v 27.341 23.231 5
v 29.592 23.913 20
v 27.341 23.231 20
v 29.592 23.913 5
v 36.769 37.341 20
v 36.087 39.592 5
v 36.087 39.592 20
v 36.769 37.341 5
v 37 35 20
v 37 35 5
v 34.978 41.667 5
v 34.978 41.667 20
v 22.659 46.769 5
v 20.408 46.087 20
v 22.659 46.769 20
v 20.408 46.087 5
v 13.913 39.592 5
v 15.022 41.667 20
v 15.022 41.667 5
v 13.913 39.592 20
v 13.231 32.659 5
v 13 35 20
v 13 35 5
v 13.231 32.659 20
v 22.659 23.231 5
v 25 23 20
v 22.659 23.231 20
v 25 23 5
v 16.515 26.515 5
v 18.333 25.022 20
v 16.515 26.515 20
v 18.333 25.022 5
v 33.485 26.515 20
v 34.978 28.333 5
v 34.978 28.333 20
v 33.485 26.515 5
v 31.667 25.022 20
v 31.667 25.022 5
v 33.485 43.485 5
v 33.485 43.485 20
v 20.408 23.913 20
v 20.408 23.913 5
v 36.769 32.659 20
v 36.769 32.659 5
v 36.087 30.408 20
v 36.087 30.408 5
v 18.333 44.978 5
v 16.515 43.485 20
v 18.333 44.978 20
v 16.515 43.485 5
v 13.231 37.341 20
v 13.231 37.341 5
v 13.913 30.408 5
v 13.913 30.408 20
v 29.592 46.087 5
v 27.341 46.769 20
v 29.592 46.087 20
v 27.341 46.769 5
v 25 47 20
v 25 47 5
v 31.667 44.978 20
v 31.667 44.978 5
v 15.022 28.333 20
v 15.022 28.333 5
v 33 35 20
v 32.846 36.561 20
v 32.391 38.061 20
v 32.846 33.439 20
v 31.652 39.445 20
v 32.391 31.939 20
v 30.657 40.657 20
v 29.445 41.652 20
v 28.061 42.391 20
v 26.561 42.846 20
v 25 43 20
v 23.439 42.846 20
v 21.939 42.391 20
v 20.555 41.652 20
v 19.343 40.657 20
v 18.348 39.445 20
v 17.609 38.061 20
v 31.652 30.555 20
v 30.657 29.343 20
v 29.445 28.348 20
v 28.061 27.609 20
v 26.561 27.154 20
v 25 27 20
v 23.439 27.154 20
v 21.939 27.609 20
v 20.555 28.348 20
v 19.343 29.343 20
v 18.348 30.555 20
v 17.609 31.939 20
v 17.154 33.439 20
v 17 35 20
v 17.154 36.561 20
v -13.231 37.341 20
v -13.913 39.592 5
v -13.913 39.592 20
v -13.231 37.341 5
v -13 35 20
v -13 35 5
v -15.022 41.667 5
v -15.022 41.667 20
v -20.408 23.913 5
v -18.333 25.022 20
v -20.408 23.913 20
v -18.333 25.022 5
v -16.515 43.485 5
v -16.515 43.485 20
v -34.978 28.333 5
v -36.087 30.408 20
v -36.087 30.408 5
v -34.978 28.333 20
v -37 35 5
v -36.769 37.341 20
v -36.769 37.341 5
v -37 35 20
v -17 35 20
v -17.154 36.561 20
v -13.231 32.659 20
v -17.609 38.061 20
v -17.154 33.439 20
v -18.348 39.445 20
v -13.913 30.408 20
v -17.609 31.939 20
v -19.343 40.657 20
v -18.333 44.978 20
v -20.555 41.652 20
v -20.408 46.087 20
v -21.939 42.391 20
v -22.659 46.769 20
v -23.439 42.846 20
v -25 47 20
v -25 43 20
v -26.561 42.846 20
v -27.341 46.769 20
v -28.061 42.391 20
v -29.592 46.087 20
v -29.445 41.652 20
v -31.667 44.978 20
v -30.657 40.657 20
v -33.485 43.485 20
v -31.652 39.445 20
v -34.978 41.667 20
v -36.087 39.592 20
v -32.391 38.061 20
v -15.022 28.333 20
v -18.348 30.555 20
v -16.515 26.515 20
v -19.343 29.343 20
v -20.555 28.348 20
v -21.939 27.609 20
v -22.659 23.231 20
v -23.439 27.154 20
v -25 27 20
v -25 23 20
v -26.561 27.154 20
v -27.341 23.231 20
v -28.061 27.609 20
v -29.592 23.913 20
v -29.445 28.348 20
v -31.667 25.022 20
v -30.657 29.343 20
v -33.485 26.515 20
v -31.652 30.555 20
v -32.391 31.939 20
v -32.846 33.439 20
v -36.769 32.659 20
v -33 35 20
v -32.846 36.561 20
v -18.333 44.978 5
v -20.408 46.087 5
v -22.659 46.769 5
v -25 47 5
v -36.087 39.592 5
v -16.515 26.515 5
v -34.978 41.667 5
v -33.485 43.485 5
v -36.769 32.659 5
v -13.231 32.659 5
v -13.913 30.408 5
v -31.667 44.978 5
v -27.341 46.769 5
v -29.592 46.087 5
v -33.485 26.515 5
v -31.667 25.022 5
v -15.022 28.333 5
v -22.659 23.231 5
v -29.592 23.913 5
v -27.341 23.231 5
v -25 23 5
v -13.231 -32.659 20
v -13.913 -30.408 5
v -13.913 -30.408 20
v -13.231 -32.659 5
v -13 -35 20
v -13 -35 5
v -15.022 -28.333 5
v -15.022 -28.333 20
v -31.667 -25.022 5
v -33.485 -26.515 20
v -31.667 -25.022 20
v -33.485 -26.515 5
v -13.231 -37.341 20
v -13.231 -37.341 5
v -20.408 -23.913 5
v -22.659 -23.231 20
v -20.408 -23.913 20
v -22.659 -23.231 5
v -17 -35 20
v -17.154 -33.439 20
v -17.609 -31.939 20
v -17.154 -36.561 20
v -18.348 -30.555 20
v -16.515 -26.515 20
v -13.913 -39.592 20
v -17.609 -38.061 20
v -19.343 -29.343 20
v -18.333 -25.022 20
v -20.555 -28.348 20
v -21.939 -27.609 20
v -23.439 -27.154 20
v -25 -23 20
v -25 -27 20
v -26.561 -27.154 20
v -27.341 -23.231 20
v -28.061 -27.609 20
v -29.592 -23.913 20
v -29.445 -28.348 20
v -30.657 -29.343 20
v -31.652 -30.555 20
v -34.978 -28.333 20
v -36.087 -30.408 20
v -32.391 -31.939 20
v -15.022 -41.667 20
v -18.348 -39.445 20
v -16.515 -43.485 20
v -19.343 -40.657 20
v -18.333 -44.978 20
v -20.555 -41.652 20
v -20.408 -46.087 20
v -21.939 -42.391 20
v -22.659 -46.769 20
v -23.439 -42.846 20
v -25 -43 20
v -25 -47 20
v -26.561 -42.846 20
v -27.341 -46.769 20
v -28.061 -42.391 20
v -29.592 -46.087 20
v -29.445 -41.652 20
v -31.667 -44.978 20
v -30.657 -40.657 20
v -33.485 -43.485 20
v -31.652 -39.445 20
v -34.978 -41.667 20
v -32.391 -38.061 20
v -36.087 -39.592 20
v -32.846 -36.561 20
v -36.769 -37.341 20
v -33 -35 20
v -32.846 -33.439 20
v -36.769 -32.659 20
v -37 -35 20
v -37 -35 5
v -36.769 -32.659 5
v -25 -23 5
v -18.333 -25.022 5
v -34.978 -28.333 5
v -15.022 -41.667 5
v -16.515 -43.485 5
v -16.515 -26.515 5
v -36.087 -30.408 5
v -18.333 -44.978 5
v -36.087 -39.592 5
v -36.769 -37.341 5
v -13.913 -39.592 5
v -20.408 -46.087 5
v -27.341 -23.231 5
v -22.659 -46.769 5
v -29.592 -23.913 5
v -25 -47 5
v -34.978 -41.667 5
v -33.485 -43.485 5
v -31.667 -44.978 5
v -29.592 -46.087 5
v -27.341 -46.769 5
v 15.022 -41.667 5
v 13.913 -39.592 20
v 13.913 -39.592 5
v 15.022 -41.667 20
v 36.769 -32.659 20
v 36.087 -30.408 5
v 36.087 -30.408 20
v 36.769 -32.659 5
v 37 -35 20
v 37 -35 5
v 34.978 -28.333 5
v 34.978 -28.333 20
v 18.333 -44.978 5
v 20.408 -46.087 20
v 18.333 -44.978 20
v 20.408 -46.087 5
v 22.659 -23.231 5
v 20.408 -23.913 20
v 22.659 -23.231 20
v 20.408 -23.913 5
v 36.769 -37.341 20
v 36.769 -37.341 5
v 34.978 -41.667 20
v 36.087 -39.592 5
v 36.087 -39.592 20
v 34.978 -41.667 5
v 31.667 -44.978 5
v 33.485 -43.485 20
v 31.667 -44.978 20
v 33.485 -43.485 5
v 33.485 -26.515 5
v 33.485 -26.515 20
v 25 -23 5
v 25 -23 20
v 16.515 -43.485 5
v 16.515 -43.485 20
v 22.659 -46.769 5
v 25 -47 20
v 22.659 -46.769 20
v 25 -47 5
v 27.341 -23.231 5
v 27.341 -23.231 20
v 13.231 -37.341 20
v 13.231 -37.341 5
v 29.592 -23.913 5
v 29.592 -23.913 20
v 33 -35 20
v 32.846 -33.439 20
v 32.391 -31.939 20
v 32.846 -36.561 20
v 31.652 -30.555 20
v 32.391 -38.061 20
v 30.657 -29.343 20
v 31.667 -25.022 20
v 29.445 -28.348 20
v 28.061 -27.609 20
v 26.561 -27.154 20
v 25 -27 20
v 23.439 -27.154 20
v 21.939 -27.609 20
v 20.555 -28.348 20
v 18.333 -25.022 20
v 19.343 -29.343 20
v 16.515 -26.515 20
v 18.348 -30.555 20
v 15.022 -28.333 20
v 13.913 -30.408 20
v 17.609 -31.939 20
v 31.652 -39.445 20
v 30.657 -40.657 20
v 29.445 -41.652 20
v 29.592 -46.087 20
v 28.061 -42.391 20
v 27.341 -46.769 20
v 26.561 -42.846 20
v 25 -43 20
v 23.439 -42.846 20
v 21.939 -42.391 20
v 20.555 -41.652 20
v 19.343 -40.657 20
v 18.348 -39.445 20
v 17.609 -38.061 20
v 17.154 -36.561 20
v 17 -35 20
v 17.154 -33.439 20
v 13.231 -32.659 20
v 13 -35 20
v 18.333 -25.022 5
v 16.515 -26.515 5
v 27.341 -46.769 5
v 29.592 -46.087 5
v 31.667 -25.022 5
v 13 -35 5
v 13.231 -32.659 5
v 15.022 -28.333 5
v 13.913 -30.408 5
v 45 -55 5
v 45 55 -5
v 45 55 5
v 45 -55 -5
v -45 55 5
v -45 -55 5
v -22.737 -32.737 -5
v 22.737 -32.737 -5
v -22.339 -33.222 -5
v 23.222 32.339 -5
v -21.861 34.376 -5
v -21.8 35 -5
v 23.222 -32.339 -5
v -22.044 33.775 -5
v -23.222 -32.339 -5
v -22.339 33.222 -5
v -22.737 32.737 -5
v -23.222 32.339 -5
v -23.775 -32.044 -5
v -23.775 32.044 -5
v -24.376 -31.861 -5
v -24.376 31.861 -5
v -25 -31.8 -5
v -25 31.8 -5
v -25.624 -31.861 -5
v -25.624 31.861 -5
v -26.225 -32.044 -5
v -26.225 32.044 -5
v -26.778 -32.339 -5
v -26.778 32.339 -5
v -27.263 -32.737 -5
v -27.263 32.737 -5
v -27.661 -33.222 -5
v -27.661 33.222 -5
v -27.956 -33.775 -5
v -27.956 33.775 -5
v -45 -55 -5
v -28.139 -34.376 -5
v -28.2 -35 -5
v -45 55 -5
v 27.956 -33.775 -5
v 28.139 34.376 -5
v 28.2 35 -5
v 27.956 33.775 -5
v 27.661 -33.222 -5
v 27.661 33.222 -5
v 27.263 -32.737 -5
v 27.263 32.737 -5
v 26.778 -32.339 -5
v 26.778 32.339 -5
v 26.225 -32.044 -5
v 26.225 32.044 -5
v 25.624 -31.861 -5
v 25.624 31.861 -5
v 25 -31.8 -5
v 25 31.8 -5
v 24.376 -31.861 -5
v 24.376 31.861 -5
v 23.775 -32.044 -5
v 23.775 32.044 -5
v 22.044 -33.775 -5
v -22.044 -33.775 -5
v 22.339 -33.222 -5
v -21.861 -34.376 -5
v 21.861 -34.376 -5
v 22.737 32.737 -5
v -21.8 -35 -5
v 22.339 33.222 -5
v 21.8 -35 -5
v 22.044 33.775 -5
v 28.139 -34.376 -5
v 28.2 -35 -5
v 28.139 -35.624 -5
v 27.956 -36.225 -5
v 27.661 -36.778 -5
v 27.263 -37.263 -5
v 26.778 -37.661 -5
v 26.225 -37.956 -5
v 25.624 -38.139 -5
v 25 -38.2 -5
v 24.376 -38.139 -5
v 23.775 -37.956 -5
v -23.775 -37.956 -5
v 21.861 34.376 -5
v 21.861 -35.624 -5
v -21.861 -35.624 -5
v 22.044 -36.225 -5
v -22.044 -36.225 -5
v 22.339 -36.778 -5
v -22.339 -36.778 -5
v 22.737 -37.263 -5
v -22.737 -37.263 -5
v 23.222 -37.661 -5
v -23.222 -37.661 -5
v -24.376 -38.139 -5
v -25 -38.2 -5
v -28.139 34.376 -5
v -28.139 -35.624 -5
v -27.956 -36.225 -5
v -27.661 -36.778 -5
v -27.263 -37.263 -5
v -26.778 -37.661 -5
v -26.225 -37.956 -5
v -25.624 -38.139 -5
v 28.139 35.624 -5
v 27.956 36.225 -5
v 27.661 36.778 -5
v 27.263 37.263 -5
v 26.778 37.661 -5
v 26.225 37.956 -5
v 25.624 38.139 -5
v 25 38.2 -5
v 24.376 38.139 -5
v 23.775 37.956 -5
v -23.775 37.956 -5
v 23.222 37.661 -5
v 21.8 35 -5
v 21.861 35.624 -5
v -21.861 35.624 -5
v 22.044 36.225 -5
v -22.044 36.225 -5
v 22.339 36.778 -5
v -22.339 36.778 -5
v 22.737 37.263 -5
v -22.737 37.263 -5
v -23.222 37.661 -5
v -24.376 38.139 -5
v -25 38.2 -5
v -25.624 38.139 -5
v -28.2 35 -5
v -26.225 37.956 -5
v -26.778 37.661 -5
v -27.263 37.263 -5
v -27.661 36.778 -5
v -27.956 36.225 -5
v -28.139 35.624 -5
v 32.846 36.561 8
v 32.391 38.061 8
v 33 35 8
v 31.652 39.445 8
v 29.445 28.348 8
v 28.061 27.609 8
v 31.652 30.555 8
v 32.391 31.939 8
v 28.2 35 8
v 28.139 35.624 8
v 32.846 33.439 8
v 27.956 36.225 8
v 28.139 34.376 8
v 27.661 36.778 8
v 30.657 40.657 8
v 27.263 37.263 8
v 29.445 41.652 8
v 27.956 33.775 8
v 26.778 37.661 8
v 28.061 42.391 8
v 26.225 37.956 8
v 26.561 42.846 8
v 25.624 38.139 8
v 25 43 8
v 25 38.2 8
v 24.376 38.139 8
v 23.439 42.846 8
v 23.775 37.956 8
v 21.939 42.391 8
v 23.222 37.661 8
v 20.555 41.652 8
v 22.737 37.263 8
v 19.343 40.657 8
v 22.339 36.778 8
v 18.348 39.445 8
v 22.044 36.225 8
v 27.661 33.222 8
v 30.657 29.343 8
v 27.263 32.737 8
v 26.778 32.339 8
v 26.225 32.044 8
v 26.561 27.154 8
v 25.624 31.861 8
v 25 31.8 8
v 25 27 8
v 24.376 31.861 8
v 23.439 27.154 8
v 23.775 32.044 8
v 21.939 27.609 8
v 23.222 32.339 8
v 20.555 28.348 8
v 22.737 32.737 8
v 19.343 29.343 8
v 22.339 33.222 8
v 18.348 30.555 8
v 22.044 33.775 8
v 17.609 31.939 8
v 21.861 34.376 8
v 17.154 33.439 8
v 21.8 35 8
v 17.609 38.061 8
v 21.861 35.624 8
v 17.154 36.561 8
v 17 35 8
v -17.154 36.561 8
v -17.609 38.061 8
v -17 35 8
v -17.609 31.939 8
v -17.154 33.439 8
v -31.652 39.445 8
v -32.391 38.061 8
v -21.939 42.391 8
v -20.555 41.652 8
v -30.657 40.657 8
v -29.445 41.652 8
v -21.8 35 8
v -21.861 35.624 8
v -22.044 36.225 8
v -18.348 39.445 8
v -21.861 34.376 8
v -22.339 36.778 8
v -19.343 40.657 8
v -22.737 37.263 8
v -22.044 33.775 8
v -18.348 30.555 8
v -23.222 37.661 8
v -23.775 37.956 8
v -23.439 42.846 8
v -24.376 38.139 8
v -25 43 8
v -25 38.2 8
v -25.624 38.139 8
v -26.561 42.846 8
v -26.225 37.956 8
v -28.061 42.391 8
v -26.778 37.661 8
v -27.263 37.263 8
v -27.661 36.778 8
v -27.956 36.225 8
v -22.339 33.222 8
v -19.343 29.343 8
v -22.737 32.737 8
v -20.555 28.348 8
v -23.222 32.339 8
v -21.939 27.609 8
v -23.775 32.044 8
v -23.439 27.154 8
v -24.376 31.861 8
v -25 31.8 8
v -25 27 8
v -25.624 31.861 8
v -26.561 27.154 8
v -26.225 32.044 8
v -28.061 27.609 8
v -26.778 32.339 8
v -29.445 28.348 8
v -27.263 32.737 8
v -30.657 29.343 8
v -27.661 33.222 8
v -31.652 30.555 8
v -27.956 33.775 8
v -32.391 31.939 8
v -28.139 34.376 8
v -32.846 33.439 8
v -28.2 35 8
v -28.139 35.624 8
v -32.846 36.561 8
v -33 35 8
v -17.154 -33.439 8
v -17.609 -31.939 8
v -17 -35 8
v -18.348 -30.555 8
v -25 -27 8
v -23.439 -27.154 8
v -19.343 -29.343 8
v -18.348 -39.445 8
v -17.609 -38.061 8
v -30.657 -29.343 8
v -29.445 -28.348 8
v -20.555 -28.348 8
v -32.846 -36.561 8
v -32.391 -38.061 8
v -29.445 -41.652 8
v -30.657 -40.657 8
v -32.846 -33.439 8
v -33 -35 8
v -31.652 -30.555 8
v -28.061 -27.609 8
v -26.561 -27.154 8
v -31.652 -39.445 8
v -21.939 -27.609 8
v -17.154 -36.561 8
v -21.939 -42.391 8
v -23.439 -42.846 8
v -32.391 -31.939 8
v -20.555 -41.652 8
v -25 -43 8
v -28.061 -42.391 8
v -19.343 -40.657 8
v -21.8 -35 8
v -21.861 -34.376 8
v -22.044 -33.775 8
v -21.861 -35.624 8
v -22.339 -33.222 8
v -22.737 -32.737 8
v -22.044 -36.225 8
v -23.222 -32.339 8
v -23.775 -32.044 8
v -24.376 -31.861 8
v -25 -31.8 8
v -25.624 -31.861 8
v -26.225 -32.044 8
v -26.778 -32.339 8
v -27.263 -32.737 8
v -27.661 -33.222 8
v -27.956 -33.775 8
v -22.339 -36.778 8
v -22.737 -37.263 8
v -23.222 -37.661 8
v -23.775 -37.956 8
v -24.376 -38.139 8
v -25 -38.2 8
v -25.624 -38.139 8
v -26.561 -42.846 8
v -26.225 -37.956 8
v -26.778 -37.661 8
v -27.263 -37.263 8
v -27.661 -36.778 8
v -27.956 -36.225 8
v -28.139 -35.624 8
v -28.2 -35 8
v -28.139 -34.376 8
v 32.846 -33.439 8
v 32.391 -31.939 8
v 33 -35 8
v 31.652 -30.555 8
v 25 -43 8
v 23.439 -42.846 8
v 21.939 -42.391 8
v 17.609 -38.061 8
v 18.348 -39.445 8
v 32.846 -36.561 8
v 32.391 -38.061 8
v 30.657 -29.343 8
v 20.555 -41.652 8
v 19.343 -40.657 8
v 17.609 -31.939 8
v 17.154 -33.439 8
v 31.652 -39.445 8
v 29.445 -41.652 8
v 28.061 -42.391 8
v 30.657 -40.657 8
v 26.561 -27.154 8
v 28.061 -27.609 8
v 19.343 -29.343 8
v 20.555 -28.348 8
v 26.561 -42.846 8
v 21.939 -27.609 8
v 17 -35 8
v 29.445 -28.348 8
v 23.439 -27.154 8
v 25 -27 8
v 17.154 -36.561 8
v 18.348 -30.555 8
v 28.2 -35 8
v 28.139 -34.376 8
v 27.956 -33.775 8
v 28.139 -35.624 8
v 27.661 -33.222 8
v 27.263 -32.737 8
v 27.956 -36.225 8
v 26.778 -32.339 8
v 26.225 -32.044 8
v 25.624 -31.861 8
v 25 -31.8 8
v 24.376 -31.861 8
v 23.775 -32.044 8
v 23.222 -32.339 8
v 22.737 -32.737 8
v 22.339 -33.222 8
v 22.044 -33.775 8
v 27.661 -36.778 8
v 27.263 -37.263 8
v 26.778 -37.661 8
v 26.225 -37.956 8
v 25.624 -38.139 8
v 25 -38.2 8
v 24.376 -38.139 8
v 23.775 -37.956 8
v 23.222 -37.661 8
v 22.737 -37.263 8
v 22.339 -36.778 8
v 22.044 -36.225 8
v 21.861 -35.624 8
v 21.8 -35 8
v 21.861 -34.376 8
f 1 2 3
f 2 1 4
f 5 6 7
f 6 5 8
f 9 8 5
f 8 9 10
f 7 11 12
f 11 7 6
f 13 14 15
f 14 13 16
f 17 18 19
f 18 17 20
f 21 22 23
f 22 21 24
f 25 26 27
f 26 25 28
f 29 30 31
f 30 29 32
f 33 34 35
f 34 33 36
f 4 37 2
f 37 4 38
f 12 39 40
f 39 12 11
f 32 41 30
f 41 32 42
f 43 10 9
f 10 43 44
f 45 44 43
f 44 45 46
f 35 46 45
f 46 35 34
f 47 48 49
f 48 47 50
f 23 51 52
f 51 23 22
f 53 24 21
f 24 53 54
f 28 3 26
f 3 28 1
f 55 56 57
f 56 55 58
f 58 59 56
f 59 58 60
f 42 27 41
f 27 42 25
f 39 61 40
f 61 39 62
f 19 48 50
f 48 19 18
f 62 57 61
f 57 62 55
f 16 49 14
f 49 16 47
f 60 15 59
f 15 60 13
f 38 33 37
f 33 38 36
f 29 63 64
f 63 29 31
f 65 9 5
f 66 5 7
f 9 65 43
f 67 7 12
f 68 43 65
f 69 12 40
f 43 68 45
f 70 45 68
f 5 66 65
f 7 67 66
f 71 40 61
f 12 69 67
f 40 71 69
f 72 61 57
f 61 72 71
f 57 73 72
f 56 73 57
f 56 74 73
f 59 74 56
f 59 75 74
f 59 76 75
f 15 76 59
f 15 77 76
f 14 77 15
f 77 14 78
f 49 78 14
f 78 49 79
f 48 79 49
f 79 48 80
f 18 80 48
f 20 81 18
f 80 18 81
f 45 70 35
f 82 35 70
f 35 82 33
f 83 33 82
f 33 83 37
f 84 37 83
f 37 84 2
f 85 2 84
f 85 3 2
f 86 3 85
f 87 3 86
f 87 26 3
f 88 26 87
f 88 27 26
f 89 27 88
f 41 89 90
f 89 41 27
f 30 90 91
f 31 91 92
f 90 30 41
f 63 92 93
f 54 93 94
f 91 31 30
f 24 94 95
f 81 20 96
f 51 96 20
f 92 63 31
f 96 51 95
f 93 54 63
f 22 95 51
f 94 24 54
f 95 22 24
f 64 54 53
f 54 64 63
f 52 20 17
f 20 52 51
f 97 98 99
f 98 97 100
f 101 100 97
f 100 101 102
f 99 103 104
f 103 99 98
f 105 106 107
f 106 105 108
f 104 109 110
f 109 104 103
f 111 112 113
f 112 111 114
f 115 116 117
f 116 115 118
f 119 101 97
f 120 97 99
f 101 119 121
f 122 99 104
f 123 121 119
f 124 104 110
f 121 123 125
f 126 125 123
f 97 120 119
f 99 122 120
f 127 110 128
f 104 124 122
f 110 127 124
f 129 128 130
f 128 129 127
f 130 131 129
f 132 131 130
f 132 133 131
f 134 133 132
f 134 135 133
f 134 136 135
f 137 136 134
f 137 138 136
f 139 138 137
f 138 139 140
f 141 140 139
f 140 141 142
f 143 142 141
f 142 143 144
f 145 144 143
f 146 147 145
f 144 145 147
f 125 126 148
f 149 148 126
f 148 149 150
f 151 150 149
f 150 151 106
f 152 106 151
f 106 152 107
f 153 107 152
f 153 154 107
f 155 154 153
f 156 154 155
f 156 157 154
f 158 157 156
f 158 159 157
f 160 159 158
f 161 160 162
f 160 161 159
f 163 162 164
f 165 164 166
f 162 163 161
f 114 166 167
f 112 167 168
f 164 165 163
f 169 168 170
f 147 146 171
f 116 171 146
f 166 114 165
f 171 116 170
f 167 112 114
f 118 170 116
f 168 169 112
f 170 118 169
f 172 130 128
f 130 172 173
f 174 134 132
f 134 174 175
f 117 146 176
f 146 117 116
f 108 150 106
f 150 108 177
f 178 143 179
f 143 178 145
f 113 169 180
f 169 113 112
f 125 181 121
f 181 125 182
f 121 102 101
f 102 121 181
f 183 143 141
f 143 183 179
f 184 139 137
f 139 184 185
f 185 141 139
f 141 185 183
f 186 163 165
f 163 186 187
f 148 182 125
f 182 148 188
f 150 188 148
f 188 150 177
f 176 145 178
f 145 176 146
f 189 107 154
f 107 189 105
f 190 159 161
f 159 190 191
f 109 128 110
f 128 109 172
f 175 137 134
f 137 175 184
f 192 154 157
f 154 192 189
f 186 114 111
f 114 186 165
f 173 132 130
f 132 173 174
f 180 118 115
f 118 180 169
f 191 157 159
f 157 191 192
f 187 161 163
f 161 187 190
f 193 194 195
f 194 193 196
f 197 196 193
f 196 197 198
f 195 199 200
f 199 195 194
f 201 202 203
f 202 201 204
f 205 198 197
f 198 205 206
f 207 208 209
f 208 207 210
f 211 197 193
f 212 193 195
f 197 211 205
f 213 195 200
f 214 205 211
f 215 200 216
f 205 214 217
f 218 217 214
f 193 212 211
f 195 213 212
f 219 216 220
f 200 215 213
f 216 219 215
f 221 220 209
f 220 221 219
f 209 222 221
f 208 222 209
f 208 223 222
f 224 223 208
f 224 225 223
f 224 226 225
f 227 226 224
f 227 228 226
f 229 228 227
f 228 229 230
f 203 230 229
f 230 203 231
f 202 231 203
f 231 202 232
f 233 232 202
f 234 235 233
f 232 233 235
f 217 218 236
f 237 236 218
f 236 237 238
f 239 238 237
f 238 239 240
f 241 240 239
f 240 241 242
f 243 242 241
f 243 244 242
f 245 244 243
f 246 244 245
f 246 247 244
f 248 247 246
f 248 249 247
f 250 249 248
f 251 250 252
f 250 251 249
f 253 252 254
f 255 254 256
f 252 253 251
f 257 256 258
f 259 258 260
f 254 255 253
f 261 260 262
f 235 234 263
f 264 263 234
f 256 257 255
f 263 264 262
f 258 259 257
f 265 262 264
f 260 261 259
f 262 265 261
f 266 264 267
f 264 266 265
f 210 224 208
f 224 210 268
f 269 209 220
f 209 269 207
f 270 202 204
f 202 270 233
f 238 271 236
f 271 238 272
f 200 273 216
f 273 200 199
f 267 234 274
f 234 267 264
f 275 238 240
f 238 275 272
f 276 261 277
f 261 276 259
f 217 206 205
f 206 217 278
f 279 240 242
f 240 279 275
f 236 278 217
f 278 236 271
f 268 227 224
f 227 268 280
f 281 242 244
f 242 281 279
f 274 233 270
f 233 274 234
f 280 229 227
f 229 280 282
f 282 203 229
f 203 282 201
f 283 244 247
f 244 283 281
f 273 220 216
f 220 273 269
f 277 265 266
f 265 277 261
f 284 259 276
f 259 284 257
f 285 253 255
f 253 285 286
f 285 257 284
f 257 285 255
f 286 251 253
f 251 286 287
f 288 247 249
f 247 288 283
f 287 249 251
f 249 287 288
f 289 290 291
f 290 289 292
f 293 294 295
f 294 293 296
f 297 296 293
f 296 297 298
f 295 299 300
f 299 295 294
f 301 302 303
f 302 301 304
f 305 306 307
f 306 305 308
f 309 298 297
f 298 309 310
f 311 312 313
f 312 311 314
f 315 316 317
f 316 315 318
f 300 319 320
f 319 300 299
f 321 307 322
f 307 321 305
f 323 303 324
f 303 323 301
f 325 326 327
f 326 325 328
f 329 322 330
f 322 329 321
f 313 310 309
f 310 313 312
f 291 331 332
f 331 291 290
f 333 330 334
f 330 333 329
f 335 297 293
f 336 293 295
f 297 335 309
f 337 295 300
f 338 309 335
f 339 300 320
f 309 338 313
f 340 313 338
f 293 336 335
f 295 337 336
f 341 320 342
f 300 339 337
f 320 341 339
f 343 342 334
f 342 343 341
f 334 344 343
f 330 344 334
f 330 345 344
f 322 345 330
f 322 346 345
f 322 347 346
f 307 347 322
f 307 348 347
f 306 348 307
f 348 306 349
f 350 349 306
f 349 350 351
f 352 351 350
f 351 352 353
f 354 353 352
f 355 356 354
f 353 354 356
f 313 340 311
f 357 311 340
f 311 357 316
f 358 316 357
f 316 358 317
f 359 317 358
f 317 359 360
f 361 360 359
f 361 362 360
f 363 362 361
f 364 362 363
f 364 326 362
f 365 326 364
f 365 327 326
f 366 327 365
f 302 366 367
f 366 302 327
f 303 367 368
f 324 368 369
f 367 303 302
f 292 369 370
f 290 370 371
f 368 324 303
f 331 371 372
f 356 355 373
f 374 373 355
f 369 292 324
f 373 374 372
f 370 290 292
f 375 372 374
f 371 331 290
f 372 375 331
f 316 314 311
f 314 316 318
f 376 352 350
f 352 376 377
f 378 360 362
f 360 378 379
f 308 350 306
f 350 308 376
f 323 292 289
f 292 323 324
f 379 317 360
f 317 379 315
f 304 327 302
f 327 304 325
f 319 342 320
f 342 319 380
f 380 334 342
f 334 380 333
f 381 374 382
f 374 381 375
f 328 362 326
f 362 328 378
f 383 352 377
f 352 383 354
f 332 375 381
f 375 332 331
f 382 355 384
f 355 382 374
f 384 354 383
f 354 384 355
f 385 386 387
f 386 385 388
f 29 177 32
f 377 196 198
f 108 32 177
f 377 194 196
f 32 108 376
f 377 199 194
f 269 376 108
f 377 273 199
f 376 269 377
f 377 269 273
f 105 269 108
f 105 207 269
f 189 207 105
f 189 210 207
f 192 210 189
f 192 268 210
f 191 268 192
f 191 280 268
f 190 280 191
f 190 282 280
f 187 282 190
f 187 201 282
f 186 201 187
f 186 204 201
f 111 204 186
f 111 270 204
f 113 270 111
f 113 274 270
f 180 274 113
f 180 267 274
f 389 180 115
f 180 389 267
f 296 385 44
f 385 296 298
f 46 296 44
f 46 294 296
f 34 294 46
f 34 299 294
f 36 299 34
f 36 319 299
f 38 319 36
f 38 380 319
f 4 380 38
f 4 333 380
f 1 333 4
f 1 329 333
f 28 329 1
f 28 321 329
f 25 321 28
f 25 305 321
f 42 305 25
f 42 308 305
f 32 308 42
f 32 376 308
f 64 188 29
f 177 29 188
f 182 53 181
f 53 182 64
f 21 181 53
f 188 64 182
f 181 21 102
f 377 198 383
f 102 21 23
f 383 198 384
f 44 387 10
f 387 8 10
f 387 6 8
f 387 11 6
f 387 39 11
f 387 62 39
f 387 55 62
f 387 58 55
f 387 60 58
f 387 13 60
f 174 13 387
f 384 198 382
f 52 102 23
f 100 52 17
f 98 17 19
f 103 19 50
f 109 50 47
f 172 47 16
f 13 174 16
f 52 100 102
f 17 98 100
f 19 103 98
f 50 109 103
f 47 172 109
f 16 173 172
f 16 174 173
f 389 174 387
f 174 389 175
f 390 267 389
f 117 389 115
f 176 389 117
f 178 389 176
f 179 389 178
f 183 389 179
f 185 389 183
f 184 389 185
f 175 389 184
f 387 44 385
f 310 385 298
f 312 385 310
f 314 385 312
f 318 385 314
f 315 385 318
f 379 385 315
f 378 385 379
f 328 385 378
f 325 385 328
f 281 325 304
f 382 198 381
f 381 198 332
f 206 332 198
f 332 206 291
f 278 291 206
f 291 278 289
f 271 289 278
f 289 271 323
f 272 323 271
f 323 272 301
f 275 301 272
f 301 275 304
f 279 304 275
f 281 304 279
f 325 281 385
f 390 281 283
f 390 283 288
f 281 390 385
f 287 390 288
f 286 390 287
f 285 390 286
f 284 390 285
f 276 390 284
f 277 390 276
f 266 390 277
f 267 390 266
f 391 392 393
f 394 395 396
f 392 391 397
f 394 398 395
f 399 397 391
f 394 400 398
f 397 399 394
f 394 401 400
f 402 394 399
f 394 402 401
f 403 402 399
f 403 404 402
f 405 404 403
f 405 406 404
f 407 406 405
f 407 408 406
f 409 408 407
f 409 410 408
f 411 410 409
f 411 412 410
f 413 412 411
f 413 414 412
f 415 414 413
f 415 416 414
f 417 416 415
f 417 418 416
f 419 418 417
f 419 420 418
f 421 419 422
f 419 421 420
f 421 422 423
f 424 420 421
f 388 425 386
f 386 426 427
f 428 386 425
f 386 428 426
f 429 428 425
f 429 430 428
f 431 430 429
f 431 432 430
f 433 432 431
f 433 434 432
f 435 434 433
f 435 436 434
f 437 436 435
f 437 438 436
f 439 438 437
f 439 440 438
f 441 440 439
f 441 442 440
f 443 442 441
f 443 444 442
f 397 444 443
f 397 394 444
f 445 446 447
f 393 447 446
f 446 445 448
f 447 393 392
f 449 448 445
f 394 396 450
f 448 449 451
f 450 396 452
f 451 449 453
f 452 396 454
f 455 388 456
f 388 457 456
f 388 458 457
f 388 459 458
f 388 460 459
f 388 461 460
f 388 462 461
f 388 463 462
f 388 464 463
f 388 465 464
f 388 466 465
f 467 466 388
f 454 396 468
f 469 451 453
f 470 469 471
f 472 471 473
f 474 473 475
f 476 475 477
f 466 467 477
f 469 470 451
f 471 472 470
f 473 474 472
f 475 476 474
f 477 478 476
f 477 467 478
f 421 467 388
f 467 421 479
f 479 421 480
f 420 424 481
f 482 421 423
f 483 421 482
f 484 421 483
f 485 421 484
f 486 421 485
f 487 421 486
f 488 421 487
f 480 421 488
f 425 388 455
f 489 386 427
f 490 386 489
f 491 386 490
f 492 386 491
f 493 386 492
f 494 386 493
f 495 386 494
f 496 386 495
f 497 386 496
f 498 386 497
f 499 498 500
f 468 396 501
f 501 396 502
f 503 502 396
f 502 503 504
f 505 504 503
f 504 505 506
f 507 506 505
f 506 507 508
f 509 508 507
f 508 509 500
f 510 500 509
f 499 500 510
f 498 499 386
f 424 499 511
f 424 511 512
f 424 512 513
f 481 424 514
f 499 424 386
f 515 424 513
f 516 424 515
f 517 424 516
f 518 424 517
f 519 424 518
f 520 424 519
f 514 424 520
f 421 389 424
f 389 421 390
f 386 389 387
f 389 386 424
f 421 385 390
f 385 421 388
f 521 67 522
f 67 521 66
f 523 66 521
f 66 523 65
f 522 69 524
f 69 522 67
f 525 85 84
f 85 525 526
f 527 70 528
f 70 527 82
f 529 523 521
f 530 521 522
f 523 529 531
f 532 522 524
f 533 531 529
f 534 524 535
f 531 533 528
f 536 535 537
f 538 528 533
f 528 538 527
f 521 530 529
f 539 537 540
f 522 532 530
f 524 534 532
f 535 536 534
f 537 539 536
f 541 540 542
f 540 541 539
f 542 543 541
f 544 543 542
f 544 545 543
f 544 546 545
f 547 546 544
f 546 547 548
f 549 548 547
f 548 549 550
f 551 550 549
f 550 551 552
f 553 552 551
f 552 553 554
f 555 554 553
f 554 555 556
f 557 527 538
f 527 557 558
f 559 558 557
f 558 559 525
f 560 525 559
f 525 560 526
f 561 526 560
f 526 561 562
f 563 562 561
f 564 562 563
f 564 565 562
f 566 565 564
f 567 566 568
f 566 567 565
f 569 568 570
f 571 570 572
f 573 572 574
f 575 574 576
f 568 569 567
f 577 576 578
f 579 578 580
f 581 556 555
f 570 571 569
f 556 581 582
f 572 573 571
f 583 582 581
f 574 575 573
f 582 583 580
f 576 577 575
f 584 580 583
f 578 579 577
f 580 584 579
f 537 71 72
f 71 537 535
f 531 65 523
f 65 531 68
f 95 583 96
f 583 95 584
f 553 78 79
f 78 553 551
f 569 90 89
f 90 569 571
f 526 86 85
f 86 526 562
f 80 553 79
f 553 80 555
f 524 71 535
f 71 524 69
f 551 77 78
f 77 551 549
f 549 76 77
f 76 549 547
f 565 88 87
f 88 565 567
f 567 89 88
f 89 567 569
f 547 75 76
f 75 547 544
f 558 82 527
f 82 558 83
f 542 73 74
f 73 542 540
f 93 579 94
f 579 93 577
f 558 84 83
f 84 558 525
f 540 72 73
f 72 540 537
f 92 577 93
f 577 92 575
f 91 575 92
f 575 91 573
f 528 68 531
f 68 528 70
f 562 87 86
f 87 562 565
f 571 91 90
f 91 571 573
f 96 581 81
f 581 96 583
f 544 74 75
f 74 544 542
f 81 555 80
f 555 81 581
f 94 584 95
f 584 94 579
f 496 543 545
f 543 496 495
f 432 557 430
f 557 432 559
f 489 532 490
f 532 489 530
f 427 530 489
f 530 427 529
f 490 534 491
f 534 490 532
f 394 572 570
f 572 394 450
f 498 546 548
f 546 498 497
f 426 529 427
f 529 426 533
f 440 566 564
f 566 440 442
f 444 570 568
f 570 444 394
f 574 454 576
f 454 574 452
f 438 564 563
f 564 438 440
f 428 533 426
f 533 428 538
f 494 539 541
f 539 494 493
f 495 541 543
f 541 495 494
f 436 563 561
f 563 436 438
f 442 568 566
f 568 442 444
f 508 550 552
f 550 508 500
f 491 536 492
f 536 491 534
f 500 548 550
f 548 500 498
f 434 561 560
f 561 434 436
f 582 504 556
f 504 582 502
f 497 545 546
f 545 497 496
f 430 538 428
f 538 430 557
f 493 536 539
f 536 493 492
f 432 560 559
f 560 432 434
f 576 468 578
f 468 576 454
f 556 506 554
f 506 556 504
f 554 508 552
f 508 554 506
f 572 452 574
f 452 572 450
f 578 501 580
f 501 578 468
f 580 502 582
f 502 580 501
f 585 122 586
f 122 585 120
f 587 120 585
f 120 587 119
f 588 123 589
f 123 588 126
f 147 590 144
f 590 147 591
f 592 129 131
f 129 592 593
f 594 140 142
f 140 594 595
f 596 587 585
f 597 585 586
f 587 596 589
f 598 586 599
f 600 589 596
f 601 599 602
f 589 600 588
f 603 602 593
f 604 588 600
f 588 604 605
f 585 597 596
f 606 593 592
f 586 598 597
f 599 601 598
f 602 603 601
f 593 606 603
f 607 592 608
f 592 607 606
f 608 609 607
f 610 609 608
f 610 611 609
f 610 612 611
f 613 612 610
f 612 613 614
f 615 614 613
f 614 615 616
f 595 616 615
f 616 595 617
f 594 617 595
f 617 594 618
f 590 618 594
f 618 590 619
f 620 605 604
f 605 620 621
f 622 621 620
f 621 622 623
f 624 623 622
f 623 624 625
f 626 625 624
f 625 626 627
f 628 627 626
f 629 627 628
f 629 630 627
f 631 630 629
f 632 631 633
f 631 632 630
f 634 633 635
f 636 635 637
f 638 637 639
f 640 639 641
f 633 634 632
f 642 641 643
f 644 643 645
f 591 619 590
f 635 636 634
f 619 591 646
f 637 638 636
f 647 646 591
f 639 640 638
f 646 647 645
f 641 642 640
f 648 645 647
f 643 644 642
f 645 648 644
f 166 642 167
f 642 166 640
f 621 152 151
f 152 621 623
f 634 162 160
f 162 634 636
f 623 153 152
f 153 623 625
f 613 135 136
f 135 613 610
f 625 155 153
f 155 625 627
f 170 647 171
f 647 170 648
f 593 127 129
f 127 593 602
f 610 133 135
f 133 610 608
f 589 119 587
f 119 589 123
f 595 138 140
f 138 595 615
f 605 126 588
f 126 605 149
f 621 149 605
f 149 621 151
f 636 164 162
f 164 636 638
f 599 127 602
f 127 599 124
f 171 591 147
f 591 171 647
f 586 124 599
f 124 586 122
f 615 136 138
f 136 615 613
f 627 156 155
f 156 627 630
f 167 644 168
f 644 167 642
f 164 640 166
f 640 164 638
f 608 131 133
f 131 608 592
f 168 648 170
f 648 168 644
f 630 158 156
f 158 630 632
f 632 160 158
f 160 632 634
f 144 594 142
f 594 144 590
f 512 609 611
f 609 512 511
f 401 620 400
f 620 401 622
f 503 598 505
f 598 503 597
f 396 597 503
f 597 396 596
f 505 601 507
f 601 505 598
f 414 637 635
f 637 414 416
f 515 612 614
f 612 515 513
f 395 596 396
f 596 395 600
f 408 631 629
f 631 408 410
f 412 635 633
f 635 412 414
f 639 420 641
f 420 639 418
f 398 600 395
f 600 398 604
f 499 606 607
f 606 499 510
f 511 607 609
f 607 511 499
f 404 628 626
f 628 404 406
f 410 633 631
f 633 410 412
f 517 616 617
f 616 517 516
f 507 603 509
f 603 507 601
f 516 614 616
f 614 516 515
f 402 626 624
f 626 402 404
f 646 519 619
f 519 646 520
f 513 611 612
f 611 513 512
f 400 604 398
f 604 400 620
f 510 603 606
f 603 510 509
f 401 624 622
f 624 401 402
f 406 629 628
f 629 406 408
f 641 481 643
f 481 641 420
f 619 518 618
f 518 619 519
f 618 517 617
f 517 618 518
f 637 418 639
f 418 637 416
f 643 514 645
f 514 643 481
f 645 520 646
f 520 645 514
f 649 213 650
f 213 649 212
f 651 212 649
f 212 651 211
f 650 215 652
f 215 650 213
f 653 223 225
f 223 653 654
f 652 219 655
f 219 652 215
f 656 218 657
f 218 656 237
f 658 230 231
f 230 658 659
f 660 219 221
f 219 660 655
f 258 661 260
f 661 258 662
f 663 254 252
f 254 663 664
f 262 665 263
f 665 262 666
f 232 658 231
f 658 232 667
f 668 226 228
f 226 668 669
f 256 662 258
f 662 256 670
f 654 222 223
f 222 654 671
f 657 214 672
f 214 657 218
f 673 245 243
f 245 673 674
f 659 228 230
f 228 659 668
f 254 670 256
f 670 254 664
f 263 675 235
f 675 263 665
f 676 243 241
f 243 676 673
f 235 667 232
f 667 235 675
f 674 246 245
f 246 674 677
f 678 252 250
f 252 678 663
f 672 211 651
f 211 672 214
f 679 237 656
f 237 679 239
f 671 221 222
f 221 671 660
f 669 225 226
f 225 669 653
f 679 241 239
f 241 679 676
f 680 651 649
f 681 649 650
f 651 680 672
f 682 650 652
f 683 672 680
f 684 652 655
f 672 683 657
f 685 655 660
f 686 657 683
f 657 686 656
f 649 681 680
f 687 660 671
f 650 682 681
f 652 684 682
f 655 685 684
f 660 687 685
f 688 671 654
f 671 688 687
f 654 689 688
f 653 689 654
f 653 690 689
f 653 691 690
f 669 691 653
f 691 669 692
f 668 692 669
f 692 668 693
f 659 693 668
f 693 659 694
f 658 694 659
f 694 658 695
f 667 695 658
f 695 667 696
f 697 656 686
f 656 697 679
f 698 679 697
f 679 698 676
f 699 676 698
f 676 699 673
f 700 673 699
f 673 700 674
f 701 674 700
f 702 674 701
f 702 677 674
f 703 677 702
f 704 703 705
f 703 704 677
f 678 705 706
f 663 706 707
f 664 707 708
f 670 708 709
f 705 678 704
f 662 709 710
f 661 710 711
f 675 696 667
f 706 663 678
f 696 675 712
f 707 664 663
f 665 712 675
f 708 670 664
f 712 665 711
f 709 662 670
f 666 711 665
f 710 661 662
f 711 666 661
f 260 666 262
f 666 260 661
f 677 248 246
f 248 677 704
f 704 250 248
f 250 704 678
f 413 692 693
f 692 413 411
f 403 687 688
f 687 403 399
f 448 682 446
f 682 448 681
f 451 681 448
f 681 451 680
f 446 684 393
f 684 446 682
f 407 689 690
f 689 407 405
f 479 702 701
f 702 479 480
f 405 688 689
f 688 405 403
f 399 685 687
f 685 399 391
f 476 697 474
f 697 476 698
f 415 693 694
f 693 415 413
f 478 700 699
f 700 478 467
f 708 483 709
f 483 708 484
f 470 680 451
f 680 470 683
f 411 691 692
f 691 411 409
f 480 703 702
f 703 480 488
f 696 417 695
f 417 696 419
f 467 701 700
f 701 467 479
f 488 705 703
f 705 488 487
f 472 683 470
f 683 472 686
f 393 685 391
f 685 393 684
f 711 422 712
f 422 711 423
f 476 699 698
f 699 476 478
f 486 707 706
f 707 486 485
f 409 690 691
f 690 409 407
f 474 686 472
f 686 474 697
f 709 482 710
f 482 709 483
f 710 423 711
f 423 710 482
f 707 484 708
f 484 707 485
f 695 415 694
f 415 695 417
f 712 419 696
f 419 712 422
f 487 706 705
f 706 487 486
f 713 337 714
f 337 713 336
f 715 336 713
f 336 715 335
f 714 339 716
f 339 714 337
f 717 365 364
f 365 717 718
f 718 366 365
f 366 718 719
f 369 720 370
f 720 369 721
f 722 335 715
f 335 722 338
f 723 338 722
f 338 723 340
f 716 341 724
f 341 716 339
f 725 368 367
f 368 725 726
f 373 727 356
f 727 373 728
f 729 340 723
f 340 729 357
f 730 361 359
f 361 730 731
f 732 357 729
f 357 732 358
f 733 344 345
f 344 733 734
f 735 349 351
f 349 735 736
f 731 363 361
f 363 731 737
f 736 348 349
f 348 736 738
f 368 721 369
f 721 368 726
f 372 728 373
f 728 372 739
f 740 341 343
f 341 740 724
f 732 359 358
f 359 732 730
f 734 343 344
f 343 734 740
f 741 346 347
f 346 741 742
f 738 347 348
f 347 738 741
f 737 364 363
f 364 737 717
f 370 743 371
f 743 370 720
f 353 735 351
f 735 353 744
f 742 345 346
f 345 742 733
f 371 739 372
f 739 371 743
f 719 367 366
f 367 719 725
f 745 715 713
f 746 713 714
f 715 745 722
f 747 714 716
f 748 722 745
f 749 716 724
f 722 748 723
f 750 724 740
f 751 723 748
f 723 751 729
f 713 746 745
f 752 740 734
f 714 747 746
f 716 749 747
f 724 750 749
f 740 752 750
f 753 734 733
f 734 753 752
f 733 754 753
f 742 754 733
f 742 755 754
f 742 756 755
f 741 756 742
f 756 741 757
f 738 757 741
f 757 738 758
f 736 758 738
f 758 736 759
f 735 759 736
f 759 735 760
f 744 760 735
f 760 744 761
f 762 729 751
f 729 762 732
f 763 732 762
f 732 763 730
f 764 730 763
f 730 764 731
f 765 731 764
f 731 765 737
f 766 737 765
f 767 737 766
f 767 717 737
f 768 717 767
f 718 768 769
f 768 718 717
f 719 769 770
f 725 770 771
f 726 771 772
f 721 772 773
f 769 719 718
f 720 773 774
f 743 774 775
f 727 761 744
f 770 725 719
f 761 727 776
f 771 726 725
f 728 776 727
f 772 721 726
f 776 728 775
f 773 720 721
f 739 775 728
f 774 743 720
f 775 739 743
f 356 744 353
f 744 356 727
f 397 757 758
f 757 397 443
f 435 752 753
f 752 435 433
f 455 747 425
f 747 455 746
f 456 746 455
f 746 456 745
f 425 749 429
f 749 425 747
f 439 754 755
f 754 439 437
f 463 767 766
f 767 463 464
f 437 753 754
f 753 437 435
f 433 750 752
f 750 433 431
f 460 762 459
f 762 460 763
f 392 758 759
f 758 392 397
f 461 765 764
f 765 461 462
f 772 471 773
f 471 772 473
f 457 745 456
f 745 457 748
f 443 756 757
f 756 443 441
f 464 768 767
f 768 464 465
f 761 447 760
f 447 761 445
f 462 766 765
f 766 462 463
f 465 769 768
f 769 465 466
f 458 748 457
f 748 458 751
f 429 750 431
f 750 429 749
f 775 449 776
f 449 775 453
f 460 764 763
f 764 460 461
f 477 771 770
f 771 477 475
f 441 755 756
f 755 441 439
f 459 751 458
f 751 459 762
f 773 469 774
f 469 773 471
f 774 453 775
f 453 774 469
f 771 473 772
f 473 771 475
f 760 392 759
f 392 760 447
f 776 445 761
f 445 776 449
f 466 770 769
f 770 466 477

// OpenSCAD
$fn = 32;

// ----------------------------------------------------------------------
// Socket pad plate
// bosses with counterbored sockets for the screws
// ----------------------------------------------------------------------

// --- parameters (mm) ---
base_t = 10;            // base plate thickness
boss_h = 15;            // boss height above the base plate
boss_d = 24;            // boss diameter
socket_d = 16;          // socket diameter
socket_depth = 12;      // socket depth from the boss face
bolt_d = 6.4;           // screw clearance hole through the socket floor
plate = [90, 110, 10];  // overall size (x, y, z)
edge = 20;              // boss centre offset from the plate edge
pads = 4;               // boss count, one per corner

// --- derived feature positions (mm) ---
height = base_t + boss_h;        // = 25   overall height of the part
corner_x = plate[0] / 2 - edge;  // = 25   boss centre X
corner_y = plate[1] / 2 - edge;  // = 35   boss centre Y
feature_centers = [
  [corner_x, corner_y],
  [-corner_x, corner_y],
  [-corner_x, -corner_y],
  [corner_x, -corner_y]
];   // boss centres: sockets, holes and the pads themselves are placed from here

// base plate, bosses on feature_centers, socket + through hole in each
difference() {
  union() {
    cube(plate, center = true);
    for (centre = feature_centers)
      translate([centre[0], centre[1], plate[2] / 2 - 1])
        cylinder(d = boss_d, h = boss_h + 1);
  }
  for (centre = feature_centers) {
    translate([centre[0], centre[1], plate[2] / 2 + boss_h - socket_depth])
      cylinder(d = socket_d, h = socket_depth + 1);
    translate([centre[0], centre[1], -height])
      cylinder(d = bolt_d, h = 2 * height + 2);  // through the socket floor
  }
}
